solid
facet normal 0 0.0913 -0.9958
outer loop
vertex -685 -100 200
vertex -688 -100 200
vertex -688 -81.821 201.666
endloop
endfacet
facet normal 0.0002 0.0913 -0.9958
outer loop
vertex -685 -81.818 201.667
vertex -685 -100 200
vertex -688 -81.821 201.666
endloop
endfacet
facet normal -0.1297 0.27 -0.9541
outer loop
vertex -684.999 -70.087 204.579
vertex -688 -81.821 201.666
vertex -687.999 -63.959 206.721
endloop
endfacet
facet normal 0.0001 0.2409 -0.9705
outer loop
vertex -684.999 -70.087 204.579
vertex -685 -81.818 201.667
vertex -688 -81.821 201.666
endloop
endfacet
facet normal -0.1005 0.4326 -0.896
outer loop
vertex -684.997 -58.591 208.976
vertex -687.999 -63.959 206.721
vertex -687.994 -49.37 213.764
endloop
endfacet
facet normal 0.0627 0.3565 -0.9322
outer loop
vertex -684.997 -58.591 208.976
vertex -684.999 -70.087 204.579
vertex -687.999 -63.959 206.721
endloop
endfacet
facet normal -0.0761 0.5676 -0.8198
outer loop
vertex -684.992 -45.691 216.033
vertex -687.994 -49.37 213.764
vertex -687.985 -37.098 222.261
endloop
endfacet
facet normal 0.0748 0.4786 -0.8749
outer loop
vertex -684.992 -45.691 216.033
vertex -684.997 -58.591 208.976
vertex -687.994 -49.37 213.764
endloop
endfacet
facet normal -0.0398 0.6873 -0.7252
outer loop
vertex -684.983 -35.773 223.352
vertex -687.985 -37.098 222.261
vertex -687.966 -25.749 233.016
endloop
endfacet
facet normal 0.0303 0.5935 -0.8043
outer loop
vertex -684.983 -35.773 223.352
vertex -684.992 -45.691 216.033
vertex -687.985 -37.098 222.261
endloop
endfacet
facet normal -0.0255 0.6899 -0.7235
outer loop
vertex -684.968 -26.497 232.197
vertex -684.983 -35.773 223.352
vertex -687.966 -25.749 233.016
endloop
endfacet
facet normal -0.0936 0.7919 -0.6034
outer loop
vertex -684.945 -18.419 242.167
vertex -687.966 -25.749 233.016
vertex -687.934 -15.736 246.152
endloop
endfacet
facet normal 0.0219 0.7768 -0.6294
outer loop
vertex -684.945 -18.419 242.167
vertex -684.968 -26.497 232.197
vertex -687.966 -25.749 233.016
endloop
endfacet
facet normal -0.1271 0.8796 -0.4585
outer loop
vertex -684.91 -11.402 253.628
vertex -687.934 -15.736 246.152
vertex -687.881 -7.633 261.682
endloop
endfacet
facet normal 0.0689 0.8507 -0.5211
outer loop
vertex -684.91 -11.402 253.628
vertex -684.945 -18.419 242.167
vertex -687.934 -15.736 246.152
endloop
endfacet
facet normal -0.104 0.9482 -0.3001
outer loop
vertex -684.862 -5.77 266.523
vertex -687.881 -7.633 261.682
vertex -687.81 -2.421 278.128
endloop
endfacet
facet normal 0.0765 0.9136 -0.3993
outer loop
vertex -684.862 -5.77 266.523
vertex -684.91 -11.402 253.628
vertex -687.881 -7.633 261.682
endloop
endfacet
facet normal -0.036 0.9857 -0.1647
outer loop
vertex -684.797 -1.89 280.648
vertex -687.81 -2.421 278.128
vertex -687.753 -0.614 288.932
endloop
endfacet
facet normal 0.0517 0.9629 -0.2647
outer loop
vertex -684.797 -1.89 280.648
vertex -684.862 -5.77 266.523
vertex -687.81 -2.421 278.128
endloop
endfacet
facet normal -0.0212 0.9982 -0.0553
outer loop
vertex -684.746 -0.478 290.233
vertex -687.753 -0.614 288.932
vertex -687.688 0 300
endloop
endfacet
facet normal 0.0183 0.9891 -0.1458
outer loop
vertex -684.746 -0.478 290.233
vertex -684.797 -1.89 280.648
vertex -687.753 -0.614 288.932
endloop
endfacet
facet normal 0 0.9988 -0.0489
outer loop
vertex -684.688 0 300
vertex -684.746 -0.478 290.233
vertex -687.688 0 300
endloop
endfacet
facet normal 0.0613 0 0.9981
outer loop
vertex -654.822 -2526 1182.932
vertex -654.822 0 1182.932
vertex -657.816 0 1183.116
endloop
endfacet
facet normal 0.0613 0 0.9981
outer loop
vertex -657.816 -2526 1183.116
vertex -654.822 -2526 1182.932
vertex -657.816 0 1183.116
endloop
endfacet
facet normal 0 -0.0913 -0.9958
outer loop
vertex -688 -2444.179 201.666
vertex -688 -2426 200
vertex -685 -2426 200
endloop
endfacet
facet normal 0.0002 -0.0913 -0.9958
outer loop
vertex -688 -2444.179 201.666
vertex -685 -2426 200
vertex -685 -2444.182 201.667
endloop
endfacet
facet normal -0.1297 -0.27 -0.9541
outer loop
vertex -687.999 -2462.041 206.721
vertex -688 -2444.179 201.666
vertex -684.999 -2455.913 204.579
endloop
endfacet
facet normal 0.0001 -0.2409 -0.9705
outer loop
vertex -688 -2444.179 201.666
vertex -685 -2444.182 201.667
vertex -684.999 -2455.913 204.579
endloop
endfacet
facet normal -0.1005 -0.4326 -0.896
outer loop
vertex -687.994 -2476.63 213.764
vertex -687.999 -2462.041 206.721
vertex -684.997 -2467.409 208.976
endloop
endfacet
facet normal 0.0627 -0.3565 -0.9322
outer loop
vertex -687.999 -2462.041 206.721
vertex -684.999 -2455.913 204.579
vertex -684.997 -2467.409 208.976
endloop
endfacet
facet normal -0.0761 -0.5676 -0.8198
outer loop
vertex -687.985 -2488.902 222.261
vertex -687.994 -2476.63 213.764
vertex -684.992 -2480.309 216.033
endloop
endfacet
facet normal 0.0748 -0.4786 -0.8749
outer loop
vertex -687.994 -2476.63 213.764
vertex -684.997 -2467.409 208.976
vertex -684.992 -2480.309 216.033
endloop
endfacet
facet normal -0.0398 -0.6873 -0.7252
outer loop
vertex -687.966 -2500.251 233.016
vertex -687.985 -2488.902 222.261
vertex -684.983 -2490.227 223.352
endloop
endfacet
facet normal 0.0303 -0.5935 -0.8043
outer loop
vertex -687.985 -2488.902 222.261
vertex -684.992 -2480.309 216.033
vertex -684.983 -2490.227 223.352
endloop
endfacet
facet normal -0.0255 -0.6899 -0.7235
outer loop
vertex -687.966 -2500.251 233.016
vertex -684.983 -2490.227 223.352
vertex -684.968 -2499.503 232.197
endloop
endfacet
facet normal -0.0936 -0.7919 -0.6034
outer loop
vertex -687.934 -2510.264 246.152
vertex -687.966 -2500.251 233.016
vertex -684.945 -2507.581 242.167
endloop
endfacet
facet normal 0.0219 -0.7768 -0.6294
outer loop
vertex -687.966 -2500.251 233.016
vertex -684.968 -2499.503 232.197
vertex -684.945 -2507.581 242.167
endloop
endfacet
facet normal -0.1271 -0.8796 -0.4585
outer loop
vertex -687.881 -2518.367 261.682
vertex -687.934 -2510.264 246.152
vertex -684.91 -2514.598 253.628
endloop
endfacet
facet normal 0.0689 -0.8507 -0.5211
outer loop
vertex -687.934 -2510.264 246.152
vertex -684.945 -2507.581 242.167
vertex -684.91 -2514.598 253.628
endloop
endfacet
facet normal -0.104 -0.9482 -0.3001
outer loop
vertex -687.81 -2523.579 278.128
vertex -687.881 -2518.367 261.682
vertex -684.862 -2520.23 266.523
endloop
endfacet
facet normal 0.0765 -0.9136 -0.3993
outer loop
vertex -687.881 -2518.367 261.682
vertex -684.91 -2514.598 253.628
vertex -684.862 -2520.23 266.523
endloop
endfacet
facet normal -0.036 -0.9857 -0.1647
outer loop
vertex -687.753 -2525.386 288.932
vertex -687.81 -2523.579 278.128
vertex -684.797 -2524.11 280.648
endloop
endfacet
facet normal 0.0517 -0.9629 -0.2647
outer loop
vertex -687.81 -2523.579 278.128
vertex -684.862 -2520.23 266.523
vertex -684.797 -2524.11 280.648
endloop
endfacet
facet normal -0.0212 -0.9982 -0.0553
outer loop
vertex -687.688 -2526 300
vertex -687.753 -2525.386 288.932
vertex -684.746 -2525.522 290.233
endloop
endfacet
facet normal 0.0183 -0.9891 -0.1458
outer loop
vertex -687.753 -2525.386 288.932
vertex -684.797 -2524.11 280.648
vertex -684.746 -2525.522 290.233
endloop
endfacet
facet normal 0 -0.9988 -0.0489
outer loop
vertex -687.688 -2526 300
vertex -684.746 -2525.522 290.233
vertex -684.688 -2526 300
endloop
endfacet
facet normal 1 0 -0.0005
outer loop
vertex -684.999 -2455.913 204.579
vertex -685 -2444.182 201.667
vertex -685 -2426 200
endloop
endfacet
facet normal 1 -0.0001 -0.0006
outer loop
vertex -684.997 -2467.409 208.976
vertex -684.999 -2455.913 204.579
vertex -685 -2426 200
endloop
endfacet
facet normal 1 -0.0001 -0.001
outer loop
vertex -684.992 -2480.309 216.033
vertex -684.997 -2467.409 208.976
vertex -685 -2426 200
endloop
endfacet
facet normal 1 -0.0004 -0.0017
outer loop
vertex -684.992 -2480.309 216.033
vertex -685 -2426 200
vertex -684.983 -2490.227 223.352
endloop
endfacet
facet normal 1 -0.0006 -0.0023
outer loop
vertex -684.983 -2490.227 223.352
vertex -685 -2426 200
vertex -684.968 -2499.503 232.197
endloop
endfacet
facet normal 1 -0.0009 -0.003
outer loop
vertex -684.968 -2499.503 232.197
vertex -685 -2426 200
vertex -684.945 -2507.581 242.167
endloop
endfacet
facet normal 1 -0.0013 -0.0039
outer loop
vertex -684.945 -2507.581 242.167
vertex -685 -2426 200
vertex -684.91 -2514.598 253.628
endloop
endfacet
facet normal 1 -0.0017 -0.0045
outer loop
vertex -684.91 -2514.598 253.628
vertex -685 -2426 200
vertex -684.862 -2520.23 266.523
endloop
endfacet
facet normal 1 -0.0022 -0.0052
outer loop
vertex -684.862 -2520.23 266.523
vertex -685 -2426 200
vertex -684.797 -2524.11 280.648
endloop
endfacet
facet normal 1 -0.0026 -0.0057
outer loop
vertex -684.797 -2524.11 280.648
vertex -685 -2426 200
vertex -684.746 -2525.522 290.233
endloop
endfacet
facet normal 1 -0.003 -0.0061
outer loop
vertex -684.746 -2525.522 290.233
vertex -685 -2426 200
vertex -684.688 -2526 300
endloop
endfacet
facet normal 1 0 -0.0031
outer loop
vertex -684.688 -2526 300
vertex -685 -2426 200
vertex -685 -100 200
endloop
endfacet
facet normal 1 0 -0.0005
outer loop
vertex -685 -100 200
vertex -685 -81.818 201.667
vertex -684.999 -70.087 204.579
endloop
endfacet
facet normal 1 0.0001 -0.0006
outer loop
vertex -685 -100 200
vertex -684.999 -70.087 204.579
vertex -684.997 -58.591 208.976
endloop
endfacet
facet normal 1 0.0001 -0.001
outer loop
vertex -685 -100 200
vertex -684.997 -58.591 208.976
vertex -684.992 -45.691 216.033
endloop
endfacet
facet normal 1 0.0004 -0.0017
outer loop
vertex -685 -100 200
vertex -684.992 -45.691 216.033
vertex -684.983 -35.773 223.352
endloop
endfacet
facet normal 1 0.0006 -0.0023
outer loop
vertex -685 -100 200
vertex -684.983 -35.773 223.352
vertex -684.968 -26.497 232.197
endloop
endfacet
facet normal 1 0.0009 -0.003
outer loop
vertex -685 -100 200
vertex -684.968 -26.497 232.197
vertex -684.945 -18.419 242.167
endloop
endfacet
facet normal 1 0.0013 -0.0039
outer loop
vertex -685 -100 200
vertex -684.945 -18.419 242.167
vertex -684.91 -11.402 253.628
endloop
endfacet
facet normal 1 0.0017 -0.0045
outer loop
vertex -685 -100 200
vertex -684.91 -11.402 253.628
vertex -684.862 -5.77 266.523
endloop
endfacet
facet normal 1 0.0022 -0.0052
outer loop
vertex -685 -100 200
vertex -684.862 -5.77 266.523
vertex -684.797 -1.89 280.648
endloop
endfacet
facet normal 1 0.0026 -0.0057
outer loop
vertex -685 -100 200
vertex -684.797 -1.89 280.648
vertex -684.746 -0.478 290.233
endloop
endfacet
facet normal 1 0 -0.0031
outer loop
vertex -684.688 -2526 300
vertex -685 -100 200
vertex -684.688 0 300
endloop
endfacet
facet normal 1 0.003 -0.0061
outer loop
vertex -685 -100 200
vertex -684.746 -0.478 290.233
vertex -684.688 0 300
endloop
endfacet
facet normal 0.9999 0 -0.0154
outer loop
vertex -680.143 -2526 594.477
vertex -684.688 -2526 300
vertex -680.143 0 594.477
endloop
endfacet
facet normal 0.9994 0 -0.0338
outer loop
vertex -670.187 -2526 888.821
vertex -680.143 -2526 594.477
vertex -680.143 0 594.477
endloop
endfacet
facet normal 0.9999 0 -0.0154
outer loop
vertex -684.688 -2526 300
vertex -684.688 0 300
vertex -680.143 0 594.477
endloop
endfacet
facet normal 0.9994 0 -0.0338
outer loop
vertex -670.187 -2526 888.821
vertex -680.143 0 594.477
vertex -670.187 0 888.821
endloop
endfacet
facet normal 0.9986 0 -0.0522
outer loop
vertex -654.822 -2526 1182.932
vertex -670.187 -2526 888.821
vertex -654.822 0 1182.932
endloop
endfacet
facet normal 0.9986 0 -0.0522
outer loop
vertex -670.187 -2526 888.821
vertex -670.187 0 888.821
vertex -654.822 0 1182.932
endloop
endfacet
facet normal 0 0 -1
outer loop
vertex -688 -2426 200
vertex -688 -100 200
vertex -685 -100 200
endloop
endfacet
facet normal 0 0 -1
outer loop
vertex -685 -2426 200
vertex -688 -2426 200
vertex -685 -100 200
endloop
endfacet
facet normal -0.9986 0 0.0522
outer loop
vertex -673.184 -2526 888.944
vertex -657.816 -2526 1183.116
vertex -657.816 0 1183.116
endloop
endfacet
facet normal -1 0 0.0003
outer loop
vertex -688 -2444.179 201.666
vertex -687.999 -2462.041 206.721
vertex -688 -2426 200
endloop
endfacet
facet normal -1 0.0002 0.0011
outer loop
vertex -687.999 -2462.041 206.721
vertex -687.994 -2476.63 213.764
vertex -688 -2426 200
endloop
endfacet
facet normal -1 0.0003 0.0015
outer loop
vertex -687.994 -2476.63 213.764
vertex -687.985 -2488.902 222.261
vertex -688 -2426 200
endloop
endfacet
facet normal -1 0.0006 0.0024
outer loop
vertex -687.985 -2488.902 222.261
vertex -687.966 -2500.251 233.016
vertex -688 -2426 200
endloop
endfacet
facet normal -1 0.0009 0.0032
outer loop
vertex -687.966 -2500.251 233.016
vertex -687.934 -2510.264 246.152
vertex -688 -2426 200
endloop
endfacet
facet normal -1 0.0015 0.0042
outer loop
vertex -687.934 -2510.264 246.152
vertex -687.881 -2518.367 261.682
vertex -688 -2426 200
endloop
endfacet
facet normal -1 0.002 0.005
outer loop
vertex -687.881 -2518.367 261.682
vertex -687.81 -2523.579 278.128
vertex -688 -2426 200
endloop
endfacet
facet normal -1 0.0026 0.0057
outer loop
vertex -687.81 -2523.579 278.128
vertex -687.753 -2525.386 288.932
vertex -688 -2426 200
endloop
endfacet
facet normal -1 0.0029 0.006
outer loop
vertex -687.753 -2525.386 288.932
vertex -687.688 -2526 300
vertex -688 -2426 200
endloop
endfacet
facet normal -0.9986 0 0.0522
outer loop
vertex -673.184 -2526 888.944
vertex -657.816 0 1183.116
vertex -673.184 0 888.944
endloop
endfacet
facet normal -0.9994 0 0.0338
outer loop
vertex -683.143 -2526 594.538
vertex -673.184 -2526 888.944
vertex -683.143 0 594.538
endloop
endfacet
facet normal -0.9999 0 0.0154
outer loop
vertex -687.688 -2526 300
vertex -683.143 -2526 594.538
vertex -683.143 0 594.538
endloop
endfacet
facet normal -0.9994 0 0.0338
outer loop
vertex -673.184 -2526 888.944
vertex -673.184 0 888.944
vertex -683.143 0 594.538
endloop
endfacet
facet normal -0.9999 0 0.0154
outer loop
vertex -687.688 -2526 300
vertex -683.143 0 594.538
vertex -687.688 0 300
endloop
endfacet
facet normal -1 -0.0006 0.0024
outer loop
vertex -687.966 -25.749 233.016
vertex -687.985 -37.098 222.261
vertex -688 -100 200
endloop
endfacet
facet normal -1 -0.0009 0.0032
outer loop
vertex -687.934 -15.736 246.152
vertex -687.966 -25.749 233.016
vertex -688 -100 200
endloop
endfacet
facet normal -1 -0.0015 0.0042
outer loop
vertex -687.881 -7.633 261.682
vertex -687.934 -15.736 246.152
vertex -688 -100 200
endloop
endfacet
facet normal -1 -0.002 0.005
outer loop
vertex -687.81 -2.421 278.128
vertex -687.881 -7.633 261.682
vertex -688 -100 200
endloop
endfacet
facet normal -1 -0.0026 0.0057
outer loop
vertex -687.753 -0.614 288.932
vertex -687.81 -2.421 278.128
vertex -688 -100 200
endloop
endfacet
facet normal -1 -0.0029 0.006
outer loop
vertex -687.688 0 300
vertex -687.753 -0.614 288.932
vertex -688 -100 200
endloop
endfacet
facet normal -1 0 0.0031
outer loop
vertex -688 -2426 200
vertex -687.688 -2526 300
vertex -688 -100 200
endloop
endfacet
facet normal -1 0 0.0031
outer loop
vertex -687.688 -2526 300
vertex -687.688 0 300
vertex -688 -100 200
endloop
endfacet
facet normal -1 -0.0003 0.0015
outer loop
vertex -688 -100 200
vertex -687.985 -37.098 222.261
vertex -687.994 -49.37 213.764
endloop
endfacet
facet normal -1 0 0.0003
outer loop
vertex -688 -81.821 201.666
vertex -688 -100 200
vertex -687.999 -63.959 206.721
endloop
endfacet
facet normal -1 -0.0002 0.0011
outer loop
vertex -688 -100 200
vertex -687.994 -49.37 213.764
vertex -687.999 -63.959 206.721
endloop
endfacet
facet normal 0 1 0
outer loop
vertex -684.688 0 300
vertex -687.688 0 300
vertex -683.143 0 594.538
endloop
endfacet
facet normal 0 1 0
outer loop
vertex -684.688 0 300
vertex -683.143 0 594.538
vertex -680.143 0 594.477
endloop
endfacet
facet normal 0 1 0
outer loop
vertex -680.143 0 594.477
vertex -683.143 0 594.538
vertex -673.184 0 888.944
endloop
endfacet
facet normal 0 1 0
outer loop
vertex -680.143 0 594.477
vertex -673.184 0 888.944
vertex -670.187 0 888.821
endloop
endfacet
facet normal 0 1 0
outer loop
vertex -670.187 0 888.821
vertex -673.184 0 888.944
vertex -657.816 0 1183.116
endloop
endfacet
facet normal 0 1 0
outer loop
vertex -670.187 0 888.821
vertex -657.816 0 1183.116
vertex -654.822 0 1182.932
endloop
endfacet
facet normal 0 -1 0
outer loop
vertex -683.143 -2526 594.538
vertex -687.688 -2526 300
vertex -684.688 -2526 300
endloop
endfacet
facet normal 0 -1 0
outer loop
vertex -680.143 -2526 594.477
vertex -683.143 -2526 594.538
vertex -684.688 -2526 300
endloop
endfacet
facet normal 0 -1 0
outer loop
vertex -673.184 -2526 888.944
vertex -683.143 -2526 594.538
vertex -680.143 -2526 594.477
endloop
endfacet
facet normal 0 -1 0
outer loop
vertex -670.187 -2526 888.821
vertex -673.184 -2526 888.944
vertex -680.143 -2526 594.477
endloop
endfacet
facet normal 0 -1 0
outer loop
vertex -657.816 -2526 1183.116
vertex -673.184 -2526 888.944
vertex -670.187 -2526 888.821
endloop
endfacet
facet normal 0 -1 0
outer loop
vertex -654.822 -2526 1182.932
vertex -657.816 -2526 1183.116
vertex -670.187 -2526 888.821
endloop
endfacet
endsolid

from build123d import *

# Parameters (mm, degrees)
F1_DEPTH = 2526
F2_R     = 100


with BuildPart() as f1:
    # F0 (on Front) → F1 (new body)
    with BuildSketch(Plane.XZ):
        with BuildLine():
            ThreePointArc((-685, 200), (-677.4536303253, 691.6975376497), (-654.8216297668, 1182.9319102019))
            Line((-654.8216297668, 1182.9319102019), (-657.8159792684, 1183.1159511275))
            ThreePointArc((-657.8159792684, 1183.1159511275), (-680.4522173679, 691.7896014733), (-688, 200))
            Line((-688, 200), (-685, 200))
        make_face()
    extrude(amount=F1_DEPTH)

    # F2
    f2_edges = [f1.edges().sort_by_distance(p)[0] for p in [
        (-686.5, -2526, 200),
        (-686.5, 0, 200),
    ]]
    fillet(f2_edges, radius=F2_R)


solid = f1.part
